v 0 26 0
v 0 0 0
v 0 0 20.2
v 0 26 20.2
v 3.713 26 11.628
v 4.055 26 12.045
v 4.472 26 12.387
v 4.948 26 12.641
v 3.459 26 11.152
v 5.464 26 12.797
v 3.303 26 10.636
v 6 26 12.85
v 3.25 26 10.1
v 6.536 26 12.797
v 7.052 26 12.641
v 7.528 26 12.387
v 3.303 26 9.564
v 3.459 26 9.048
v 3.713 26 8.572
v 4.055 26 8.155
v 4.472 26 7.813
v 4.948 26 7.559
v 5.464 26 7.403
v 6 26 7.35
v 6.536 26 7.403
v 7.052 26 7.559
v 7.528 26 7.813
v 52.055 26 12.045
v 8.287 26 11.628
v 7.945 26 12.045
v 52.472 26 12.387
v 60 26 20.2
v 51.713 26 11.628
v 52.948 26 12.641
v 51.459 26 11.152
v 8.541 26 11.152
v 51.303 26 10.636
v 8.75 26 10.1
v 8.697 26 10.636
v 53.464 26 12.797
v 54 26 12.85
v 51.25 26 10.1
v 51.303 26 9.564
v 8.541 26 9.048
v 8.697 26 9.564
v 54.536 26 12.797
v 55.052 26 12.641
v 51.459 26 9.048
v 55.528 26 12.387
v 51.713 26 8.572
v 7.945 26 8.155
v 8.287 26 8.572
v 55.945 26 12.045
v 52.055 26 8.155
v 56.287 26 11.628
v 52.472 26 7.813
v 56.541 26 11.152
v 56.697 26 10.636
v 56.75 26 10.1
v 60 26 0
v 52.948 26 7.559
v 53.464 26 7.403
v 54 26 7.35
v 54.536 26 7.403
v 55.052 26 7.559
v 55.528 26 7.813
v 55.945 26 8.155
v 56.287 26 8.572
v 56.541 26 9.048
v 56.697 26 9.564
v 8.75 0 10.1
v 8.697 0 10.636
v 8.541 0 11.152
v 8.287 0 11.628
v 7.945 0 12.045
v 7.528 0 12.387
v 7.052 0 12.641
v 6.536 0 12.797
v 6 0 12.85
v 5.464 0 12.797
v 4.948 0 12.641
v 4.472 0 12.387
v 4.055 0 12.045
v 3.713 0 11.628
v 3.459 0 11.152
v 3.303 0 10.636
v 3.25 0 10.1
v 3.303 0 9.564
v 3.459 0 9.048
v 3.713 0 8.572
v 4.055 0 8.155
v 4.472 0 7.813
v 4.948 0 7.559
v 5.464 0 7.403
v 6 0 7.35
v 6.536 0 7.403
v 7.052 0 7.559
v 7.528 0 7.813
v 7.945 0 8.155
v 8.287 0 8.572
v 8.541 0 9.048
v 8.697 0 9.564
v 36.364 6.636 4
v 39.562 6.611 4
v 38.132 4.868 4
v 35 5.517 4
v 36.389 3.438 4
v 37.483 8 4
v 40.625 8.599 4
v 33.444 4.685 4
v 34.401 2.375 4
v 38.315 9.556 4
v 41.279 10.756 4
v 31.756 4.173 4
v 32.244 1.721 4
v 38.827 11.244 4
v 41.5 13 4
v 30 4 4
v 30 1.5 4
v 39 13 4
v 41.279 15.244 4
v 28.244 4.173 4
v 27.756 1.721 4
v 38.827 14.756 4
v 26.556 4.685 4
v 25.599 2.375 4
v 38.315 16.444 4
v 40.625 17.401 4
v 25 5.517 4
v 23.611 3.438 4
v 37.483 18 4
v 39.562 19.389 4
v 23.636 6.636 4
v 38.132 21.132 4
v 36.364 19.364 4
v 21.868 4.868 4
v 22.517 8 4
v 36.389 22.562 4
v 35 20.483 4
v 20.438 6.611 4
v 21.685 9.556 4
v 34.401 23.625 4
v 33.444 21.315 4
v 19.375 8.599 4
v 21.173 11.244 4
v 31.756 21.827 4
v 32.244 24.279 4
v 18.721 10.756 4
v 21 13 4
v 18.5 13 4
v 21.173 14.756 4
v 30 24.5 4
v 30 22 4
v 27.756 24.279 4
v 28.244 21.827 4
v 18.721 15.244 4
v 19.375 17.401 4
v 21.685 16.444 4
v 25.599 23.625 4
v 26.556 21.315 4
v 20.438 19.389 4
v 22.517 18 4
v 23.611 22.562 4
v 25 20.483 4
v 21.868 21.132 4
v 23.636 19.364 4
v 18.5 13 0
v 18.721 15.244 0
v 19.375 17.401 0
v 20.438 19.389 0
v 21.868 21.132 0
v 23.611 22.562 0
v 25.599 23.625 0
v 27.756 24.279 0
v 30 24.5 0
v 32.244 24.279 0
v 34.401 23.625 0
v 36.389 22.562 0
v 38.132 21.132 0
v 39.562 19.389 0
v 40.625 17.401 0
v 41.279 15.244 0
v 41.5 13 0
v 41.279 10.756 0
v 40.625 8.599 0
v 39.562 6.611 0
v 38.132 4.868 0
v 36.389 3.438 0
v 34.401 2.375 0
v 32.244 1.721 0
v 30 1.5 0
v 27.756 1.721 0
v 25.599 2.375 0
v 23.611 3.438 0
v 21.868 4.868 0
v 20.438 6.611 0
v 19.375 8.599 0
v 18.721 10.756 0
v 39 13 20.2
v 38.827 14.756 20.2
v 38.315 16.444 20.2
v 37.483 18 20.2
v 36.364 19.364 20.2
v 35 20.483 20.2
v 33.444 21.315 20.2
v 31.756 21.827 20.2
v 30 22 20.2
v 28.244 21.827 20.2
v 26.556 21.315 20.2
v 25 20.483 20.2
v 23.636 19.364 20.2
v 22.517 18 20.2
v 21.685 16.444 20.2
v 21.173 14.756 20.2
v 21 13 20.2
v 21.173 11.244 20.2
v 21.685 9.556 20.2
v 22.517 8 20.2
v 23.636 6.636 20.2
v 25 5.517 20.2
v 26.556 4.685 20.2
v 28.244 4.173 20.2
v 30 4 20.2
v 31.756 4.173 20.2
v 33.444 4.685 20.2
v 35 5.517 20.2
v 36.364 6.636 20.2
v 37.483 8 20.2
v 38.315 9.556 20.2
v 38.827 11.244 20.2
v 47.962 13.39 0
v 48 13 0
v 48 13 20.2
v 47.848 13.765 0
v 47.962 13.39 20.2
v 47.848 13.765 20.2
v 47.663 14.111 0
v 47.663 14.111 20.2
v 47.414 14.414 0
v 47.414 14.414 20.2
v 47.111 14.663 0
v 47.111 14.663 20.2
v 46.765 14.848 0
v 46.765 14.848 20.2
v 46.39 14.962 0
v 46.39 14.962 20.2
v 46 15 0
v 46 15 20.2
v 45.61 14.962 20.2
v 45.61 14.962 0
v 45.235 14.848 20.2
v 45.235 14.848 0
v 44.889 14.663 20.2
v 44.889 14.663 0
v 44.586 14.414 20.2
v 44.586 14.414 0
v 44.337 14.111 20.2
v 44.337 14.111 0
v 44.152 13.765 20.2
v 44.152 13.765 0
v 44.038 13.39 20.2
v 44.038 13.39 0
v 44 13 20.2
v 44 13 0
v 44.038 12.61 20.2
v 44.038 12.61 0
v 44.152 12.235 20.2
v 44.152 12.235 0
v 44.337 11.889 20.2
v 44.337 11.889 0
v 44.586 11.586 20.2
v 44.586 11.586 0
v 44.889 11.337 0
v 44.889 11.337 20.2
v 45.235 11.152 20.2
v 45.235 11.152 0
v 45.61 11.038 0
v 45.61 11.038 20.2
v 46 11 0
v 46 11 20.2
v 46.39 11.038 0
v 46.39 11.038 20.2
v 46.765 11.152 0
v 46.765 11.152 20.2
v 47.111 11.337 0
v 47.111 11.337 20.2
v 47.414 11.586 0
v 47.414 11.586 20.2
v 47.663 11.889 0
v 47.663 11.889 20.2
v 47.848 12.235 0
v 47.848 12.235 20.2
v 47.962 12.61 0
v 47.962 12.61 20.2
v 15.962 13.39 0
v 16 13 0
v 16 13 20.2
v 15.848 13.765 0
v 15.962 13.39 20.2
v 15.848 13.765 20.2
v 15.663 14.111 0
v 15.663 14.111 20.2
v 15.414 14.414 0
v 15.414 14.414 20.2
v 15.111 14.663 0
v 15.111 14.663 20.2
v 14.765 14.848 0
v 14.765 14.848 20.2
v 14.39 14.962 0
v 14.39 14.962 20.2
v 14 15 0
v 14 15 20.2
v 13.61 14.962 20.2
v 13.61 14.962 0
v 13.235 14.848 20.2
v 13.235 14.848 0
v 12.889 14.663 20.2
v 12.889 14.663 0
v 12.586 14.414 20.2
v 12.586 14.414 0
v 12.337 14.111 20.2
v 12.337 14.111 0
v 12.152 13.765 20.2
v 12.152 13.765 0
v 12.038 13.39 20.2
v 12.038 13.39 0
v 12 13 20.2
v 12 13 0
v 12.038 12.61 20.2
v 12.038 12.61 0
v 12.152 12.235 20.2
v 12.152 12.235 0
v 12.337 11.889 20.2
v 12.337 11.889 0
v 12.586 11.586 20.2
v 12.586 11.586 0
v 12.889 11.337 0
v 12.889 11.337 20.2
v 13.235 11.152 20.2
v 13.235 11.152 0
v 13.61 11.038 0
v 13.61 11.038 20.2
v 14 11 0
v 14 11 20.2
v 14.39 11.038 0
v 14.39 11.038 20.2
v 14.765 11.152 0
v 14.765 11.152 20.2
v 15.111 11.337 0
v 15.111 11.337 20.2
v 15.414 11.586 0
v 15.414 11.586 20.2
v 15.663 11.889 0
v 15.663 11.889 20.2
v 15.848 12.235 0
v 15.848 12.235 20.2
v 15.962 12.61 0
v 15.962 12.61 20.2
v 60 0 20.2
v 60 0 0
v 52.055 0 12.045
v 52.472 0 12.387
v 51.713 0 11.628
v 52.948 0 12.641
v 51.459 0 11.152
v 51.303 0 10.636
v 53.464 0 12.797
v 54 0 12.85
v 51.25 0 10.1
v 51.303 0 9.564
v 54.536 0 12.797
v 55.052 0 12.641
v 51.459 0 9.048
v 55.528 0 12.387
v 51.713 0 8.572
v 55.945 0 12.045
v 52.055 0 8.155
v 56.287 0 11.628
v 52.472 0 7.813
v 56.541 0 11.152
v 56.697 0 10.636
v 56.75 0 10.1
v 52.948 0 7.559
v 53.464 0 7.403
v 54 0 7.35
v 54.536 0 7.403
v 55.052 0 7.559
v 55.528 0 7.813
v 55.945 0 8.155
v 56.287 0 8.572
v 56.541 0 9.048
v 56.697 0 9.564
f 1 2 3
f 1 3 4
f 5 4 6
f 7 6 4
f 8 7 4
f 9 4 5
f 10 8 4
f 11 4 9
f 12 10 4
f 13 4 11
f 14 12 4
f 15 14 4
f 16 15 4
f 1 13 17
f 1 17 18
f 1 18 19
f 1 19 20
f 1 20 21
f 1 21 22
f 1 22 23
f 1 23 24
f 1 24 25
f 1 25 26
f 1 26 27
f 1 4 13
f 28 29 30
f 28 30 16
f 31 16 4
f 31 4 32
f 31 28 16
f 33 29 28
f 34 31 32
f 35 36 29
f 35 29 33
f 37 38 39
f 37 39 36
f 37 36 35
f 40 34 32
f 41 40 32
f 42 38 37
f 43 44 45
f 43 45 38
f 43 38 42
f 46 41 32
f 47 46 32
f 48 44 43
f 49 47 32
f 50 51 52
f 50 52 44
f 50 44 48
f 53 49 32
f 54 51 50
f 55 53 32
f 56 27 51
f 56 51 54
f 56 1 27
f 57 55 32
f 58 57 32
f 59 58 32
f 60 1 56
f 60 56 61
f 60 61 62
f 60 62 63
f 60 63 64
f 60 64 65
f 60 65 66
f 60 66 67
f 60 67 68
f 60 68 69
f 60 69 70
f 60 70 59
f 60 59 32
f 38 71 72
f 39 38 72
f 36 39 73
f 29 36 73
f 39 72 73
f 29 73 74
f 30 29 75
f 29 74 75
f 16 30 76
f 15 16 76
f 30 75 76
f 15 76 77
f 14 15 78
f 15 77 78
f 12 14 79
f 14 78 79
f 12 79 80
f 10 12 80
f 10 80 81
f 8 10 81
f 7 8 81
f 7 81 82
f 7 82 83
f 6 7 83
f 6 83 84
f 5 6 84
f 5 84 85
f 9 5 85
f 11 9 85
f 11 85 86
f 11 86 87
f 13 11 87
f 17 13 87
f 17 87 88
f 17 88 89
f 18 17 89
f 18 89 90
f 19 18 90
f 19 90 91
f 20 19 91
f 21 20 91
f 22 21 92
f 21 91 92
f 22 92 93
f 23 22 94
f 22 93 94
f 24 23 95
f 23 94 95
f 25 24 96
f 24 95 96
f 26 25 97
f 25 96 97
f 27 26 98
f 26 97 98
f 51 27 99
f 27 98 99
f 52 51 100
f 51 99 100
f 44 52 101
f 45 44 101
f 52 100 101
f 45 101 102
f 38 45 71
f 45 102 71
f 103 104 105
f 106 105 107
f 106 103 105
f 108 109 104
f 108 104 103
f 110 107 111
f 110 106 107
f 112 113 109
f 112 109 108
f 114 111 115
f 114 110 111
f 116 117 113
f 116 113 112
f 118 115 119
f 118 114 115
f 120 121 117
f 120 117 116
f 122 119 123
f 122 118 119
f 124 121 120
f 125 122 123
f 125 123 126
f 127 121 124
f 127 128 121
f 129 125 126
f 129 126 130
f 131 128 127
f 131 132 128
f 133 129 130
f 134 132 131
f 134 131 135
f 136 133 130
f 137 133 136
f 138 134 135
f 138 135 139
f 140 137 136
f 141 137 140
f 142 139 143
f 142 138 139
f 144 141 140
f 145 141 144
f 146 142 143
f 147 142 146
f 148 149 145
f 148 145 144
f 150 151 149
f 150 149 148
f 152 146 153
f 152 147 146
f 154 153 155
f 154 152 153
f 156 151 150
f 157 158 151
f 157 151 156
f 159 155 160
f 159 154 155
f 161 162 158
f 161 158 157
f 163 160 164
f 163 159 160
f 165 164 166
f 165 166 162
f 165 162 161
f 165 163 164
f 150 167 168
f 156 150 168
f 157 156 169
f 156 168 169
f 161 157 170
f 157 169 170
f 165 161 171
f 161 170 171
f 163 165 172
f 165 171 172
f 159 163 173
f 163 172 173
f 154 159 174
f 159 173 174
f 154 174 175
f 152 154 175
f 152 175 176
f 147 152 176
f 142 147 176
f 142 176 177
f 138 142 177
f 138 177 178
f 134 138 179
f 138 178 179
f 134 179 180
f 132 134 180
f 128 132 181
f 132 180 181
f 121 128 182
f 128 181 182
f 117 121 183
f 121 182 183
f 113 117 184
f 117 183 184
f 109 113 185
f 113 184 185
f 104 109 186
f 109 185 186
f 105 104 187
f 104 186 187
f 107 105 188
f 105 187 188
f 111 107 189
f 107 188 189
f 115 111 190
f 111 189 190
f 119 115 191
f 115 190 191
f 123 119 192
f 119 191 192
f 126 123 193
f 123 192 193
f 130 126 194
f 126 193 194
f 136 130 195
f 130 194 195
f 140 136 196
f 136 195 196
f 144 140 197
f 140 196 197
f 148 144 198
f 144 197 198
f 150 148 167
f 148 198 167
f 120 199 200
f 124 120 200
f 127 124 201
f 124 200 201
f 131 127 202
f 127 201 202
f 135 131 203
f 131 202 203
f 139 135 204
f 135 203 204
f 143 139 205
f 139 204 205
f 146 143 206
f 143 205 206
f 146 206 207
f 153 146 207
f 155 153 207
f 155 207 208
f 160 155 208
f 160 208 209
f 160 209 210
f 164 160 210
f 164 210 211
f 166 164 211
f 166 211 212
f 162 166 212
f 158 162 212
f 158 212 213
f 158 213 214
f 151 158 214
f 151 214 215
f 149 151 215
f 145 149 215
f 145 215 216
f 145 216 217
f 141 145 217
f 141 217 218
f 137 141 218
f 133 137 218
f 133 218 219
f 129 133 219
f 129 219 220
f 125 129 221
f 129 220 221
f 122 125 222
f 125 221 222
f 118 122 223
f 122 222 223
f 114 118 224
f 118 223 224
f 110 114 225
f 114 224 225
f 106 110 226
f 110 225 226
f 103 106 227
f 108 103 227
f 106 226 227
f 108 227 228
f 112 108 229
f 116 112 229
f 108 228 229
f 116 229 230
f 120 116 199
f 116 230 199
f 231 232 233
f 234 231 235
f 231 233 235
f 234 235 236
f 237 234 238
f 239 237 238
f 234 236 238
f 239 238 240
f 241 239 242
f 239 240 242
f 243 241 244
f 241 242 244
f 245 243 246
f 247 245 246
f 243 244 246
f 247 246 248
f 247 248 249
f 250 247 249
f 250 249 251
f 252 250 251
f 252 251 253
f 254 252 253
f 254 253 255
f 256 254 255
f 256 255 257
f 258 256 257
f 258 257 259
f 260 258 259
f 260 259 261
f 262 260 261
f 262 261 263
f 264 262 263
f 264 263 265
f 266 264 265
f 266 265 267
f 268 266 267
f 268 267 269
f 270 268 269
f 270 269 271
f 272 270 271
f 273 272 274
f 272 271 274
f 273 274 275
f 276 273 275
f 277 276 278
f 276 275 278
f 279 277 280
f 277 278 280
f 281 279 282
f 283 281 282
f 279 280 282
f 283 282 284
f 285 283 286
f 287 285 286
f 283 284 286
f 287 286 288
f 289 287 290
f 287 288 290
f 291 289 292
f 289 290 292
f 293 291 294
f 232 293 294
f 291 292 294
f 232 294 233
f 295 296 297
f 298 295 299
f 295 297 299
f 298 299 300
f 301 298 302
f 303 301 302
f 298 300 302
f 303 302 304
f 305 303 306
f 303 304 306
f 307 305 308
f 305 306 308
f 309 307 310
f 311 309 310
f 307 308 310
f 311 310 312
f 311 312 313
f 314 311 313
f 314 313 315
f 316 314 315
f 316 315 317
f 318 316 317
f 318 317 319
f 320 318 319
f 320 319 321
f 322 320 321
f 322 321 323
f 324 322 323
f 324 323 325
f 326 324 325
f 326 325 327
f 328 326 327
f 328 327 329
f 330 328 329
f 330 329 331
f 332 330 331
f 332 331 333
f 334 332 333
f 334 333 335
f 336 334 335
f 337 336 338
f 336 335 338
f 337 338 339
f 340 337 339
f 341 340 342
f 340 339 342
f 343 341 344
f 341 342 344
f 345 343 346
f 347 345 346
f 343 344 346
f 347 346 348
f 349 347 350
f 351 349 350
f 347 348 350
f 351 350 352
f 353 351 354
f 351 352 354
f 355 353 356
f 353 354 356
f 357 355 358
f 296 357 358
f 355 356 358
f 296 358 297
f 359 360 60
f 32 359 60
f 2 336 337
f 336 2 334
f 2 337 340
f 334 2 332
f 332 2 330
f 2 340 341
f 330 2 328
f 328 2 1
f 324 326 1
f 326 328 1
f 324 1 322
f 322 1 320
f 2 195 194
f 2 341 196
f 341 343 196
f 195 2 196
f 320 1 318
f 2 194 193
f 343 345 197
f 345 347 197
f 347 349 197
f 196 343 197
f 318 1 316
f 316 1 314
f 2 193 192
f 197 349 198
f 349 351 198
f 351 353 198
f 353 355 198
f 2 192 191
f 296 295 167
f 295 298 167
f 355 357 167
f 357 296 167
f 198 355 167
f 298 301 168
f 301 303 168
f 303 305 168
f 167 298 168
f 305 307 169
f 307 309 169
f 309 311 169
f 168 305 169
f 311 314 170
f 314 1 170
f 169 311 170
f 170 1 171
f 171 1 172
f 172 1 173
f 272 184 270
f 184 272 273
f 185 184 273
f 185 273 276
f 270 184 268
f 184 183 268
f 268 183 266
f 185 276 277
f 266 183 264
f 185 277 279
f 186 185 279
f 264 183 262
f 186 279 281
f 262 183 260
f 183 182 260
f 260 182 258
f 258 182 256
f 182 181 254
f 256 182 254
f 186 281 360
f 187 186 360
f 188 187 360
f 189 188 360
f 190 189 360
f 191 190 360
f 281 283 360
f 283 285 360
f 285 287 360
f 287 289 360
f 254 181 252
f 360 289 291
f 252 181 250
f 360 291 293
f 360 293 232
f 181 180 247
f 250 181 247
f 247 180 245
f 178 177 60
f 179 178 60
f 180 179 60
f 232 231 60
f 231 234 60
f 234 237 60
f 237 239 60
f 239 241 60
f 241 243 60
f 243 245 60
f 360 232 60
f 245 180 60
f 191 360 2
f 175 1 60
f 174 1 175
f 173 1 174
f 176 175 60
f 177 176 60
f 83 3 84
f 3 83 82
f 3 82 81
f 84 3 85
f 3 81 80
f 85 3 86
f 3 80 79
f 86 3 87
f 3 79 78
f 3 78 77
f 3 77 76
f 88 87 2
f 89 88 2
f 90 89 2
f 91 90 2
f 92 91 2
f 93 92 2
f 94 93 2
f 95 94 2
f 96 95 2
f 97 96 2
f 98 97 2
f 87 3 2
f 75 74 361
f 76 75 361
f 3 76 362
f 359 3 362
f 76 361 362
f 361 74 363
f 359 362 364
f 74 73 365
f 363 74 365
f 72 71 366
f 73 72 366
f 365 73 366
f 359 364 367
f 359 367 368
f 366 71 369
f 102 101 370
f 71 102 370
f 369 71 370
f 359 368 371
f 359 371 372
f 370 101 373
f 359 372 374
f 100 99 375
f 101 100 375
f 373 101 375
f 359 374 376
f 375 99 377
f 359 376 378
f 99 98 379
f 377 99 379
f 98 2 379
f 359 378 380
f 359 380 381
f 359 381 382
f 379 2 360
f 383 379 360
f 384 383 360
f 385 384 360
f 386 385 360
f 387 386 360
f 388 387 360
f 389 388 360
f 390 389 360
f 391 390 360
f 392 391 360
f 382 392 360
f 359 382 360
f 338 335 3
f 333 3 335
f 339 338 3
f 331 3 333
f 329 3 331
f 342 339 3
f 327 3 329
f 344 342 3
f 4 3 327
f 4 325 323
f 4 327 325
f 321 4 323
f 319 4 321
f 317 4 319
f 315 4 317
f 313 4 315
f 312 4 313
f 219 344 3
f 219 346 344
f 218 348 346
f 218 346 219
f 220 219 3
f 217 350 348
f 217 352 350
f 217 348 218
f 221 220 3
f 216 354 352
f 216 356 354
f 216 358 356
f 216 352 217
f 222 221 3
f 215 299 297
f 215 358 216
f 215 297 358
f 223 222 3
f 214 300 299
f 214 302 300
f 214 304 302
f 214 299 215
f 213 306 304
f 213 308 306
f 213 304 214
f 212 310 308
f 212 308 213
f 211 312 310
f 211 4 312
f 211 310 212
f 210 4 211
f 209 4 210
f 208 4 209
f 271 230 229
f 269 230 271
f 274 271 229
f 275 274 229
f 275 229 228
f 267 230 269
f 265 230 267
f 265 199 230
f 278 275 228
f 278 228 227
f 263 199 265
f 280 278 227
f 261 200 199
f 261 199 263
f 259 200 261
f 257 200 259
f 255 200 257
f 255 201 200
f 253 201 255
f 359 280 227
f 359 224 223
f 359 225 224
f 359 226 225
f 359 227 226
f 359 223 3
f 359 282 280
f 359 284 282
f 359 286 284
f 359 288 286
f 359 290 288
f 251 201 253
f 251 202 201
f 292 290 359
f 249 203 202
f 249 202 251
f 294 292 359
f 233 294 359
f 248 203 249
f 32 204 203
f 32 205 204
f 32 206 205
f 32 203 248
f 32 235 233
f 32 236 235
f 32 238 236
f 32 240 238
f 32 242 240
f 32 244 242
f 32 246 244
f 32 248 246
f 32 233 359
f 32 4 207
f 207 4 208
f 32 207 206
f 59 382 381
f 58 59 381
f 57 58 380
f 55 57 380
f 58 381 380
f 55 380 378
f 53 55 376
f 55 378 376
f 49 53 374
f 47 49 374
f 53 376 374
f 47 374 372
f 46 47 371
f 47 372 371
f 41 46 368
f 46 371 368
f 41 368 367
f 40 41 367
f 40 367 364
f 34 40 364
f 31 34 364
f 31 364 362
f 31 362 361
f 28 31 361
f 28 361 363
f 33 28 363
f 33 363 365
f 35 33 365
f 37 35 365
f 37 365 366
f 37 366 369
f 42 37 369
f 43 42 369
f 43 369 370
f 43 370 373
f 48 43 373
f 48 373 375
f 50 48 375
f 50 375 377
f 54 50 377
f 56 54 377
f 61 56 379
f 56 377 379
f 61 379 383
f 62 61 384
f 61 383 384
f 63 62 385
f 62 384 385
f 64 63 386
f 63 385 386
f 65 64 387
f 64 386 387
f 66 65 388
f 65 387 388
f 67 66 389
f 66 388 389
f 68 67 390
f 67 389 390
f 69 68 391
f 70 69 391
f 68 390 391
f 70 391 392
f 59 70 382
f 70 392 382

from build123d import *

# Parameters (mm, degrees)
SKETCH1_W                      = 60
SKETCH1_H                      = 26
BOSS_EXTRUDE1_DEPTH            = 20.2
SKETCH2_R                      = 9
SKETCH2_R_2                    = 2
CUT_EXTRUDE1_DEPTH             = 69.440046756
SKETCH3_R                      = 11.5
CUT_EXTRUDE2_DEPTH             = 4
F_5_5_5_5_DIAMETER_HOLE1_D     = 5.5
F_5_5_5_5_DIAMETER_HOLE1_DEPTH = 30
F_5_5_5_5_DIAMETER_HOLE1_TIP   = 1.652366702


with BuildPart() as part:
    # Sketch1 → Boss-Extrude1 (new body)
    with BuildSketch(Plane.XY):
        with Locations((30, 13)):
            Rectangle(SKETCH1_W, SKETCH1_H)
    extrude(amount=BOSS_EXTRUDE1_DEPTH)

    # Sketch2 → Cut-Extrude1 (cut, through all)
    with BuildSketch(Plane.XY.offset(20.2)):
        with Locations((30, 13)):
            Circle(SKETCH2_R)
        with Locations((14, 13)):
            Circle(SKETCH2_R_2)
        with Locations((46, 13)):
            Circle(SKETCH2_R_2)
    extrude(amount=-CUT_EXTRUDE1_DEPTH, mode=Mode.SUBTRACT)

    # Sketch3 → Cut-Extrude2 (cut)
    with BuildSketch(Plane(origin=(0, 0, 0), x_dir=(-1, 0, 0), z_dir=(0, 0, -1))):
        with Locations((-30, 13)):
            Circle(SKETCH3_R)
    extrude(amount=-CUT_EXTRUDE2_DEPTH, mode=Mode.SUBTRACT)

    # Ø5.5 (5.5) Diameter Hole1
    with Locations(Plane(origin=(0, 26, 0), x_dir=(-1, 0, 0), z_dir=(0, 1, 0))):
        with Locations((-6, 10.1), (-54, 10.1)):
            Hole(F_5_5_5_5_DIAMETER_HOLE1_D / 2, depth=F_5_5_5_5_DIAMETER_HOLE1_DEPTH)
            with Locations((0, 0, -(F_5_5_5_5_DIAMETER_HOLE1_DEPTH + F_5_5_5_5_DIAMETER_HOLE1_TIP / 2))):  # 118° drill point
                Cone(0, F_5_5_5_5_DIAMETER_HOLE1_D / 2, F_5_5_5_5_DIAMETER_HOLE1_TIP, mode=Mode.SUBTRACT)


solid = part.part
